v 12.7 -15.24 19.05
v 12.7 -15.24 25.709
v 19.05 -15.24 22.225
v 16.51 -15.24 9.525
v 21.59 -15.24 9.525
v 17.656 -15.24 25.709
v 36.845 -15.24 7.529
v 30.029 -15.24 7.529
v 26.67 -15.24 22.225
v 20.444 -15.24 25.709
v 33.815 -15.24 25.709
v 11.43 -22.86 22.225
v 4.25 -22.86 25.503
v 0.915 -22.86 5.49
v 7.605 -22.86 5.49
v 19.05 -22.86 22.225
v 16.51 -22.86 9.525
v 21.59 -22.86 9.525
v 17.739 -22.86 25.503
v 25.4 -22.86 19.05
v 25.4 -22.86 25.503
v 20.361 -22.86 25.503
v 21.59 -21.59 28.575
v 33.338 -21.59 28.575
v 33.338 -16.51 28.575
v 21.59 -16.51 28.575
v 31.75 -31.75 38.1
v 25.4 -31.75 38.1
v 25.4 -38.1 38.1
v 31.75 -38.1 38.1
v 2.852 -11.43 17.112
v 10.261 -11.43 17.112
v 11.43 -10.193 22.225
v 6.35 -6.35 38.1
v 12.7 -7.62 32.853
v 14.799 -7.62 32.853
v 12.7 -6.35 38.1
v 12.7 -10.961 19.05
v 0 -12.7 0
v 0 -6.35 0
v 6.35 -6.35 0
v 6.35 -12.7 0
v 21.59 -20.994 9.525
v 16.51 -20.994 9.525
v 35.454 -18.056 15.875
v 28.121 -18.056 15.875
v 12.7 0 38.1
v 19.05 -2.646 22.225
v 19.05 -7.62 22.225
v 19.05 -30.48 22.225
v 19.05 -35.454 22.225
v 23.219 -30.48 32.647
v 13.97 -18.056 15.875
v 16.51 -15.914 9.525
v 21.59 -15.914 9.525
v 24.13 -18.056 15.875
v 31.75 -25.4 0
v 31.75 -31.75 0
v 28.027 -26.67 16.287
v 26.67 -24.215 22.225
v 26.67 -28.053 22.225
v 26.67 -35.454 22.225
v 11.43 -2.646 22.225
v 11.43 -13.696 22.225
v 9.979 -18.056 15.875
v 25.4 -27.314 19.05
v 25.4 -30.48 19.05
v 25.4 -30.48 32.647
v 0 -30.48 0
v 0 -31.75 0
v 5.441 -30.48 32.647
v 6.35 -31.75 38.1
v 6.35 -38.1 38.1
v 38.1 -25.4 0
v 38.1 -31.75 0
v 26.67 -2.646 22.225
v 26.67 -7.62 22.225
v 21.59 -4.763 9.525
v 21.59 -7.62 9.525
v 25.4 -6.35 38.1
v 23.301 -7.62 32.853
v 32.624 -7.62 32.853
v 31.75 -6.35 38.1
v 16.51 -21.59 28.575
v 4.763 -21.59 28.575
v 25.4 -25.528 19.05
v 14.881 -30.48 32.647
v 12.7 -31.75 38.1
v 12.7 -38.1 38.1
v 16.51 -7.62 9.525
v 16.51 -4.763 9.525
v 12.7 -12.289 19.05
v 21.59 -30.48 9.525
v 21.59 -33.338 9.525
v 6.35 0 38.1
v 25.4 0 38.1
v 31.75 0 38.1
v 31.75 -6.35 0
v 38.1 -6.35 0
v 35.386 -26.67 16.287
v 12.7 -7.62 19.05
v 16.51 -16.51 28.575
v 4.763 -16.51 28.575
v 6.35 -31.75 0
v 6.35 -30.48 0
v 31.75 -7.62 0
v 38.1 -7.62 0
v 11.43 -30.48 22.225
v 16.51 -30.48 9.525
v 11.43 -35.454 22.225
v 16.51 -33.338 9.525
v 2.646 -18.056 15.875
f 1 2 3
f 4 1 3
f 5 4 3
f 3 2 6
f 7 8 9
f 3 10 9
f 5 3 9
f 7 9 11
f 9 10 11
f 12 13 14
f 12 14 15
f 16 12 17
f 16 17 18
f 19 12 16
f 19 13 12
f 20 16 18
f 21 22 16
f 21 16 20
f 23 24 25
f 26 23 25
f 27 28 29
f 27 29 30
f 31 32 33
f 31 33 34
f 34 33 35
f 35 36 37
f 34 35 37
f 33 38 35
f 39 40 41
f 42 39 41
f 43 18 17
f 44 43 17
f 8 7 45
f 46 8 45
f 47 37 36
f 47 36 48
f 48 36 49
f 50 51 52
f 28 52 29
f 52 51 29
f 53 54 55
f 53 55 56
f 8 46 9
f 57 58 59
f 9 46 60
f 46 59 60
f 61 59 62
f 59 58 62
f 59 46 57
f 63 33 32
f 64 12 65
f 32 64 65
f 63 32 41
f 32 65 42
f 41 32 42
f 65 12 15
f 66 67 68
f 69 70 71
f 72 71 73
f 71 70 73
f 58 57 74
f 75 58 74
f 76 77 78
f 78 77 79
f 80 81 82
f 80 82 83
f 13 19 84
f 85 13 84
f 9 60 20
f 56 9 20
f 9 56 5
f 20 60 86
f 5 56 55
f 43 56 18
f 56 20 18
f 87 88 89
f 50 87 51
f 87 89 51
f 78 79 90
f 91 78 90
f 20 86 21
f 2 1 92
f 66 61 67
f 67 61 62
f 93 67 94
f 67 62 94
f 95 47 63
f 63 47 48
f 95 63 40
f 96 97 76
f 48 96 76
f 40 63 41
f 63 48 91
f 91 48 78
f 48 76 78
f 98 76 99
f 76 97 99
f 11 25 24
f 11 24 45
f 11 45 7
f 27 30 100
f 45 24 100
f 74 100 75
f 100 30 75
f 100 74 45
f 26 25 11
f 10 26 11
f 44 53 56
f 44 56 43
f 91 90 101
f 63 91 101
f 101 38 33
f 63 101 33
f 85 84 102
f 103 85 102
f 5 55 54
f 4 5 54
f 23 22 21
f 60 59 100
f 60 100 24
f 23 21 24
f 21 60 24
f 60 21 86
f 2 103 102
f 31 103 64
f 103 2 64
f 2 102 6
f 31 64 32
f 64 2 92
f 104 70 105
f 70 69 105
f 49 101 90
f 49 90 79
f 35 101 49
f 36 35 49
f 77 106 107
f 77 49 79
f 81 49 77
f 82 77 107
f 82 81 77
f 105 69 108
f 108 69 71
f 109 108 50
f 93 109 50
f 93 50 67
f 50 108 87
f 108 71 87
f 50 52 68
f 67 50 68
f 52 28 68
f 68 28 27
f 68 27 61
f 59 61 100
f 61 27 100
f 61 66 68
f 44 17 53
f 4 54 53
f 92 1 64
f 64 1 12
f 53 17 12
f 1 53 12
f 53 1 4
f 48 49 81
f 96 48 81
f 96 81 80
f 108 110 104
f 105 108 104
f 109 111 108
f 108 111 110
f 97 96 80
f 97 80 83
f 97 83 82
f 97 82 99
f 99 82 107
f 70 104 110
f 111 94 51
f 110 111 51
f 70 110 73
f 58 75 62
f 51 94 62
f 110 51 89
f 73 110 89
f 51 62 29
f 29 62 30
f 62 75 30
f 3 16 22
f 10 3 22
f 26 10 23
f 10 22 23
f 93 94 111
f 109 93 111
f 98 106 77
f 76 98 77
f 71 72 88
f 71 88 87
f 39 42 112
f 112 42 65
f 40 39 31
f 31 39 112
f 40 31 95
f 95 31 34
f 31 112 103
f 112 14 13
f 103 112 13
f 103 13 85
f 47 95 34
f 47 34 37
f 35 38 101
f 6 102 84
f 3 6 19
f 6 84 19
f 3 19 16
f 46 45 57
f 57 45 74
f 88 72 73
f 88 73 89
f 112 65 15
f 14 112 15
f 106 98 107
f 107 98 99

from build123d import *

# Parameters (mm, degrees)
F0_W      = 38.1
F0_H      = 38.1
F1_DEPTH  = 38.1
F6_DEPTH  = 38.1
F8_DEPTH  = 38.1
F9_W      = 25.4
F9_H      = 7.62
F10_DEPTH = 38.1


with BuildPart() as f1:
    # F0 (on Front) → F1 (new body)
    with BuildSketch(Plane.XZ):
        with Locations((19.05, 19.05)):
            Rectangle(F0_W, F0_H)
    extrude(amount=F1_DEPTH)

    # F5 (on offset) → F6 (cut)
    with BuildSketch(Plane.YZ.offset(38.1)):
        Polygon((-11.43, 17.112495), (-6.35, 38.1), (-31.75, 38.1), (-26.67, 16.286777), (-21.59, 28.575), (-16.51, 28.575), align=None)
        Polygon((-31.75, 0), (-38.1, 38.1), (-38.1, 0), align=None)
        Polygon((-25.4, 0), (-12.7, 0), (-18.055946, 15.875), align=None)
        Polygon((-6.35, 0), (0, 0), (0, 38.1), align=None)
    extrude(amount=-F6_DEPTH, mode=Mode.SUBTRACT)

    # F7 (on offset) → F8 (cut)
    with BuildSketch(Plane.XZ.offset(38.1)):
        Polygon((11.43, 22.225), (6.35, 0), (31.75, 0), (26.67, 22.225), (21.59, 9.525), (16.51, 9.525), align=None)
        Polygon((0, 38.1), (0, 0), (6.35, 38.1), align=None)
        Polygon((25.4, 38.1), (12.7, 38.1), (19.05, 22.225), align=None)
        Polygon((31.75, 38.1), (38.1, 0), (38.1, 38.1), align=None)
    extrude(amount=-F8_DEPTH, mode=Mode.SUBTRACT)

    # F9 (on offset) → F10 (cut)
    with BuildSketch(Plane.XY.offset(38.1)):
        with Locations((25.4, -11.43)):
            Rectangle(F9_W, F9_H)
        with Locations((12.7, -26.67)):
            Rectangle(F9_W, F9_H)
    extrude(amount=-F10_DEPTH, mode=Mode.SUBTRACT)


solid = f1.part
